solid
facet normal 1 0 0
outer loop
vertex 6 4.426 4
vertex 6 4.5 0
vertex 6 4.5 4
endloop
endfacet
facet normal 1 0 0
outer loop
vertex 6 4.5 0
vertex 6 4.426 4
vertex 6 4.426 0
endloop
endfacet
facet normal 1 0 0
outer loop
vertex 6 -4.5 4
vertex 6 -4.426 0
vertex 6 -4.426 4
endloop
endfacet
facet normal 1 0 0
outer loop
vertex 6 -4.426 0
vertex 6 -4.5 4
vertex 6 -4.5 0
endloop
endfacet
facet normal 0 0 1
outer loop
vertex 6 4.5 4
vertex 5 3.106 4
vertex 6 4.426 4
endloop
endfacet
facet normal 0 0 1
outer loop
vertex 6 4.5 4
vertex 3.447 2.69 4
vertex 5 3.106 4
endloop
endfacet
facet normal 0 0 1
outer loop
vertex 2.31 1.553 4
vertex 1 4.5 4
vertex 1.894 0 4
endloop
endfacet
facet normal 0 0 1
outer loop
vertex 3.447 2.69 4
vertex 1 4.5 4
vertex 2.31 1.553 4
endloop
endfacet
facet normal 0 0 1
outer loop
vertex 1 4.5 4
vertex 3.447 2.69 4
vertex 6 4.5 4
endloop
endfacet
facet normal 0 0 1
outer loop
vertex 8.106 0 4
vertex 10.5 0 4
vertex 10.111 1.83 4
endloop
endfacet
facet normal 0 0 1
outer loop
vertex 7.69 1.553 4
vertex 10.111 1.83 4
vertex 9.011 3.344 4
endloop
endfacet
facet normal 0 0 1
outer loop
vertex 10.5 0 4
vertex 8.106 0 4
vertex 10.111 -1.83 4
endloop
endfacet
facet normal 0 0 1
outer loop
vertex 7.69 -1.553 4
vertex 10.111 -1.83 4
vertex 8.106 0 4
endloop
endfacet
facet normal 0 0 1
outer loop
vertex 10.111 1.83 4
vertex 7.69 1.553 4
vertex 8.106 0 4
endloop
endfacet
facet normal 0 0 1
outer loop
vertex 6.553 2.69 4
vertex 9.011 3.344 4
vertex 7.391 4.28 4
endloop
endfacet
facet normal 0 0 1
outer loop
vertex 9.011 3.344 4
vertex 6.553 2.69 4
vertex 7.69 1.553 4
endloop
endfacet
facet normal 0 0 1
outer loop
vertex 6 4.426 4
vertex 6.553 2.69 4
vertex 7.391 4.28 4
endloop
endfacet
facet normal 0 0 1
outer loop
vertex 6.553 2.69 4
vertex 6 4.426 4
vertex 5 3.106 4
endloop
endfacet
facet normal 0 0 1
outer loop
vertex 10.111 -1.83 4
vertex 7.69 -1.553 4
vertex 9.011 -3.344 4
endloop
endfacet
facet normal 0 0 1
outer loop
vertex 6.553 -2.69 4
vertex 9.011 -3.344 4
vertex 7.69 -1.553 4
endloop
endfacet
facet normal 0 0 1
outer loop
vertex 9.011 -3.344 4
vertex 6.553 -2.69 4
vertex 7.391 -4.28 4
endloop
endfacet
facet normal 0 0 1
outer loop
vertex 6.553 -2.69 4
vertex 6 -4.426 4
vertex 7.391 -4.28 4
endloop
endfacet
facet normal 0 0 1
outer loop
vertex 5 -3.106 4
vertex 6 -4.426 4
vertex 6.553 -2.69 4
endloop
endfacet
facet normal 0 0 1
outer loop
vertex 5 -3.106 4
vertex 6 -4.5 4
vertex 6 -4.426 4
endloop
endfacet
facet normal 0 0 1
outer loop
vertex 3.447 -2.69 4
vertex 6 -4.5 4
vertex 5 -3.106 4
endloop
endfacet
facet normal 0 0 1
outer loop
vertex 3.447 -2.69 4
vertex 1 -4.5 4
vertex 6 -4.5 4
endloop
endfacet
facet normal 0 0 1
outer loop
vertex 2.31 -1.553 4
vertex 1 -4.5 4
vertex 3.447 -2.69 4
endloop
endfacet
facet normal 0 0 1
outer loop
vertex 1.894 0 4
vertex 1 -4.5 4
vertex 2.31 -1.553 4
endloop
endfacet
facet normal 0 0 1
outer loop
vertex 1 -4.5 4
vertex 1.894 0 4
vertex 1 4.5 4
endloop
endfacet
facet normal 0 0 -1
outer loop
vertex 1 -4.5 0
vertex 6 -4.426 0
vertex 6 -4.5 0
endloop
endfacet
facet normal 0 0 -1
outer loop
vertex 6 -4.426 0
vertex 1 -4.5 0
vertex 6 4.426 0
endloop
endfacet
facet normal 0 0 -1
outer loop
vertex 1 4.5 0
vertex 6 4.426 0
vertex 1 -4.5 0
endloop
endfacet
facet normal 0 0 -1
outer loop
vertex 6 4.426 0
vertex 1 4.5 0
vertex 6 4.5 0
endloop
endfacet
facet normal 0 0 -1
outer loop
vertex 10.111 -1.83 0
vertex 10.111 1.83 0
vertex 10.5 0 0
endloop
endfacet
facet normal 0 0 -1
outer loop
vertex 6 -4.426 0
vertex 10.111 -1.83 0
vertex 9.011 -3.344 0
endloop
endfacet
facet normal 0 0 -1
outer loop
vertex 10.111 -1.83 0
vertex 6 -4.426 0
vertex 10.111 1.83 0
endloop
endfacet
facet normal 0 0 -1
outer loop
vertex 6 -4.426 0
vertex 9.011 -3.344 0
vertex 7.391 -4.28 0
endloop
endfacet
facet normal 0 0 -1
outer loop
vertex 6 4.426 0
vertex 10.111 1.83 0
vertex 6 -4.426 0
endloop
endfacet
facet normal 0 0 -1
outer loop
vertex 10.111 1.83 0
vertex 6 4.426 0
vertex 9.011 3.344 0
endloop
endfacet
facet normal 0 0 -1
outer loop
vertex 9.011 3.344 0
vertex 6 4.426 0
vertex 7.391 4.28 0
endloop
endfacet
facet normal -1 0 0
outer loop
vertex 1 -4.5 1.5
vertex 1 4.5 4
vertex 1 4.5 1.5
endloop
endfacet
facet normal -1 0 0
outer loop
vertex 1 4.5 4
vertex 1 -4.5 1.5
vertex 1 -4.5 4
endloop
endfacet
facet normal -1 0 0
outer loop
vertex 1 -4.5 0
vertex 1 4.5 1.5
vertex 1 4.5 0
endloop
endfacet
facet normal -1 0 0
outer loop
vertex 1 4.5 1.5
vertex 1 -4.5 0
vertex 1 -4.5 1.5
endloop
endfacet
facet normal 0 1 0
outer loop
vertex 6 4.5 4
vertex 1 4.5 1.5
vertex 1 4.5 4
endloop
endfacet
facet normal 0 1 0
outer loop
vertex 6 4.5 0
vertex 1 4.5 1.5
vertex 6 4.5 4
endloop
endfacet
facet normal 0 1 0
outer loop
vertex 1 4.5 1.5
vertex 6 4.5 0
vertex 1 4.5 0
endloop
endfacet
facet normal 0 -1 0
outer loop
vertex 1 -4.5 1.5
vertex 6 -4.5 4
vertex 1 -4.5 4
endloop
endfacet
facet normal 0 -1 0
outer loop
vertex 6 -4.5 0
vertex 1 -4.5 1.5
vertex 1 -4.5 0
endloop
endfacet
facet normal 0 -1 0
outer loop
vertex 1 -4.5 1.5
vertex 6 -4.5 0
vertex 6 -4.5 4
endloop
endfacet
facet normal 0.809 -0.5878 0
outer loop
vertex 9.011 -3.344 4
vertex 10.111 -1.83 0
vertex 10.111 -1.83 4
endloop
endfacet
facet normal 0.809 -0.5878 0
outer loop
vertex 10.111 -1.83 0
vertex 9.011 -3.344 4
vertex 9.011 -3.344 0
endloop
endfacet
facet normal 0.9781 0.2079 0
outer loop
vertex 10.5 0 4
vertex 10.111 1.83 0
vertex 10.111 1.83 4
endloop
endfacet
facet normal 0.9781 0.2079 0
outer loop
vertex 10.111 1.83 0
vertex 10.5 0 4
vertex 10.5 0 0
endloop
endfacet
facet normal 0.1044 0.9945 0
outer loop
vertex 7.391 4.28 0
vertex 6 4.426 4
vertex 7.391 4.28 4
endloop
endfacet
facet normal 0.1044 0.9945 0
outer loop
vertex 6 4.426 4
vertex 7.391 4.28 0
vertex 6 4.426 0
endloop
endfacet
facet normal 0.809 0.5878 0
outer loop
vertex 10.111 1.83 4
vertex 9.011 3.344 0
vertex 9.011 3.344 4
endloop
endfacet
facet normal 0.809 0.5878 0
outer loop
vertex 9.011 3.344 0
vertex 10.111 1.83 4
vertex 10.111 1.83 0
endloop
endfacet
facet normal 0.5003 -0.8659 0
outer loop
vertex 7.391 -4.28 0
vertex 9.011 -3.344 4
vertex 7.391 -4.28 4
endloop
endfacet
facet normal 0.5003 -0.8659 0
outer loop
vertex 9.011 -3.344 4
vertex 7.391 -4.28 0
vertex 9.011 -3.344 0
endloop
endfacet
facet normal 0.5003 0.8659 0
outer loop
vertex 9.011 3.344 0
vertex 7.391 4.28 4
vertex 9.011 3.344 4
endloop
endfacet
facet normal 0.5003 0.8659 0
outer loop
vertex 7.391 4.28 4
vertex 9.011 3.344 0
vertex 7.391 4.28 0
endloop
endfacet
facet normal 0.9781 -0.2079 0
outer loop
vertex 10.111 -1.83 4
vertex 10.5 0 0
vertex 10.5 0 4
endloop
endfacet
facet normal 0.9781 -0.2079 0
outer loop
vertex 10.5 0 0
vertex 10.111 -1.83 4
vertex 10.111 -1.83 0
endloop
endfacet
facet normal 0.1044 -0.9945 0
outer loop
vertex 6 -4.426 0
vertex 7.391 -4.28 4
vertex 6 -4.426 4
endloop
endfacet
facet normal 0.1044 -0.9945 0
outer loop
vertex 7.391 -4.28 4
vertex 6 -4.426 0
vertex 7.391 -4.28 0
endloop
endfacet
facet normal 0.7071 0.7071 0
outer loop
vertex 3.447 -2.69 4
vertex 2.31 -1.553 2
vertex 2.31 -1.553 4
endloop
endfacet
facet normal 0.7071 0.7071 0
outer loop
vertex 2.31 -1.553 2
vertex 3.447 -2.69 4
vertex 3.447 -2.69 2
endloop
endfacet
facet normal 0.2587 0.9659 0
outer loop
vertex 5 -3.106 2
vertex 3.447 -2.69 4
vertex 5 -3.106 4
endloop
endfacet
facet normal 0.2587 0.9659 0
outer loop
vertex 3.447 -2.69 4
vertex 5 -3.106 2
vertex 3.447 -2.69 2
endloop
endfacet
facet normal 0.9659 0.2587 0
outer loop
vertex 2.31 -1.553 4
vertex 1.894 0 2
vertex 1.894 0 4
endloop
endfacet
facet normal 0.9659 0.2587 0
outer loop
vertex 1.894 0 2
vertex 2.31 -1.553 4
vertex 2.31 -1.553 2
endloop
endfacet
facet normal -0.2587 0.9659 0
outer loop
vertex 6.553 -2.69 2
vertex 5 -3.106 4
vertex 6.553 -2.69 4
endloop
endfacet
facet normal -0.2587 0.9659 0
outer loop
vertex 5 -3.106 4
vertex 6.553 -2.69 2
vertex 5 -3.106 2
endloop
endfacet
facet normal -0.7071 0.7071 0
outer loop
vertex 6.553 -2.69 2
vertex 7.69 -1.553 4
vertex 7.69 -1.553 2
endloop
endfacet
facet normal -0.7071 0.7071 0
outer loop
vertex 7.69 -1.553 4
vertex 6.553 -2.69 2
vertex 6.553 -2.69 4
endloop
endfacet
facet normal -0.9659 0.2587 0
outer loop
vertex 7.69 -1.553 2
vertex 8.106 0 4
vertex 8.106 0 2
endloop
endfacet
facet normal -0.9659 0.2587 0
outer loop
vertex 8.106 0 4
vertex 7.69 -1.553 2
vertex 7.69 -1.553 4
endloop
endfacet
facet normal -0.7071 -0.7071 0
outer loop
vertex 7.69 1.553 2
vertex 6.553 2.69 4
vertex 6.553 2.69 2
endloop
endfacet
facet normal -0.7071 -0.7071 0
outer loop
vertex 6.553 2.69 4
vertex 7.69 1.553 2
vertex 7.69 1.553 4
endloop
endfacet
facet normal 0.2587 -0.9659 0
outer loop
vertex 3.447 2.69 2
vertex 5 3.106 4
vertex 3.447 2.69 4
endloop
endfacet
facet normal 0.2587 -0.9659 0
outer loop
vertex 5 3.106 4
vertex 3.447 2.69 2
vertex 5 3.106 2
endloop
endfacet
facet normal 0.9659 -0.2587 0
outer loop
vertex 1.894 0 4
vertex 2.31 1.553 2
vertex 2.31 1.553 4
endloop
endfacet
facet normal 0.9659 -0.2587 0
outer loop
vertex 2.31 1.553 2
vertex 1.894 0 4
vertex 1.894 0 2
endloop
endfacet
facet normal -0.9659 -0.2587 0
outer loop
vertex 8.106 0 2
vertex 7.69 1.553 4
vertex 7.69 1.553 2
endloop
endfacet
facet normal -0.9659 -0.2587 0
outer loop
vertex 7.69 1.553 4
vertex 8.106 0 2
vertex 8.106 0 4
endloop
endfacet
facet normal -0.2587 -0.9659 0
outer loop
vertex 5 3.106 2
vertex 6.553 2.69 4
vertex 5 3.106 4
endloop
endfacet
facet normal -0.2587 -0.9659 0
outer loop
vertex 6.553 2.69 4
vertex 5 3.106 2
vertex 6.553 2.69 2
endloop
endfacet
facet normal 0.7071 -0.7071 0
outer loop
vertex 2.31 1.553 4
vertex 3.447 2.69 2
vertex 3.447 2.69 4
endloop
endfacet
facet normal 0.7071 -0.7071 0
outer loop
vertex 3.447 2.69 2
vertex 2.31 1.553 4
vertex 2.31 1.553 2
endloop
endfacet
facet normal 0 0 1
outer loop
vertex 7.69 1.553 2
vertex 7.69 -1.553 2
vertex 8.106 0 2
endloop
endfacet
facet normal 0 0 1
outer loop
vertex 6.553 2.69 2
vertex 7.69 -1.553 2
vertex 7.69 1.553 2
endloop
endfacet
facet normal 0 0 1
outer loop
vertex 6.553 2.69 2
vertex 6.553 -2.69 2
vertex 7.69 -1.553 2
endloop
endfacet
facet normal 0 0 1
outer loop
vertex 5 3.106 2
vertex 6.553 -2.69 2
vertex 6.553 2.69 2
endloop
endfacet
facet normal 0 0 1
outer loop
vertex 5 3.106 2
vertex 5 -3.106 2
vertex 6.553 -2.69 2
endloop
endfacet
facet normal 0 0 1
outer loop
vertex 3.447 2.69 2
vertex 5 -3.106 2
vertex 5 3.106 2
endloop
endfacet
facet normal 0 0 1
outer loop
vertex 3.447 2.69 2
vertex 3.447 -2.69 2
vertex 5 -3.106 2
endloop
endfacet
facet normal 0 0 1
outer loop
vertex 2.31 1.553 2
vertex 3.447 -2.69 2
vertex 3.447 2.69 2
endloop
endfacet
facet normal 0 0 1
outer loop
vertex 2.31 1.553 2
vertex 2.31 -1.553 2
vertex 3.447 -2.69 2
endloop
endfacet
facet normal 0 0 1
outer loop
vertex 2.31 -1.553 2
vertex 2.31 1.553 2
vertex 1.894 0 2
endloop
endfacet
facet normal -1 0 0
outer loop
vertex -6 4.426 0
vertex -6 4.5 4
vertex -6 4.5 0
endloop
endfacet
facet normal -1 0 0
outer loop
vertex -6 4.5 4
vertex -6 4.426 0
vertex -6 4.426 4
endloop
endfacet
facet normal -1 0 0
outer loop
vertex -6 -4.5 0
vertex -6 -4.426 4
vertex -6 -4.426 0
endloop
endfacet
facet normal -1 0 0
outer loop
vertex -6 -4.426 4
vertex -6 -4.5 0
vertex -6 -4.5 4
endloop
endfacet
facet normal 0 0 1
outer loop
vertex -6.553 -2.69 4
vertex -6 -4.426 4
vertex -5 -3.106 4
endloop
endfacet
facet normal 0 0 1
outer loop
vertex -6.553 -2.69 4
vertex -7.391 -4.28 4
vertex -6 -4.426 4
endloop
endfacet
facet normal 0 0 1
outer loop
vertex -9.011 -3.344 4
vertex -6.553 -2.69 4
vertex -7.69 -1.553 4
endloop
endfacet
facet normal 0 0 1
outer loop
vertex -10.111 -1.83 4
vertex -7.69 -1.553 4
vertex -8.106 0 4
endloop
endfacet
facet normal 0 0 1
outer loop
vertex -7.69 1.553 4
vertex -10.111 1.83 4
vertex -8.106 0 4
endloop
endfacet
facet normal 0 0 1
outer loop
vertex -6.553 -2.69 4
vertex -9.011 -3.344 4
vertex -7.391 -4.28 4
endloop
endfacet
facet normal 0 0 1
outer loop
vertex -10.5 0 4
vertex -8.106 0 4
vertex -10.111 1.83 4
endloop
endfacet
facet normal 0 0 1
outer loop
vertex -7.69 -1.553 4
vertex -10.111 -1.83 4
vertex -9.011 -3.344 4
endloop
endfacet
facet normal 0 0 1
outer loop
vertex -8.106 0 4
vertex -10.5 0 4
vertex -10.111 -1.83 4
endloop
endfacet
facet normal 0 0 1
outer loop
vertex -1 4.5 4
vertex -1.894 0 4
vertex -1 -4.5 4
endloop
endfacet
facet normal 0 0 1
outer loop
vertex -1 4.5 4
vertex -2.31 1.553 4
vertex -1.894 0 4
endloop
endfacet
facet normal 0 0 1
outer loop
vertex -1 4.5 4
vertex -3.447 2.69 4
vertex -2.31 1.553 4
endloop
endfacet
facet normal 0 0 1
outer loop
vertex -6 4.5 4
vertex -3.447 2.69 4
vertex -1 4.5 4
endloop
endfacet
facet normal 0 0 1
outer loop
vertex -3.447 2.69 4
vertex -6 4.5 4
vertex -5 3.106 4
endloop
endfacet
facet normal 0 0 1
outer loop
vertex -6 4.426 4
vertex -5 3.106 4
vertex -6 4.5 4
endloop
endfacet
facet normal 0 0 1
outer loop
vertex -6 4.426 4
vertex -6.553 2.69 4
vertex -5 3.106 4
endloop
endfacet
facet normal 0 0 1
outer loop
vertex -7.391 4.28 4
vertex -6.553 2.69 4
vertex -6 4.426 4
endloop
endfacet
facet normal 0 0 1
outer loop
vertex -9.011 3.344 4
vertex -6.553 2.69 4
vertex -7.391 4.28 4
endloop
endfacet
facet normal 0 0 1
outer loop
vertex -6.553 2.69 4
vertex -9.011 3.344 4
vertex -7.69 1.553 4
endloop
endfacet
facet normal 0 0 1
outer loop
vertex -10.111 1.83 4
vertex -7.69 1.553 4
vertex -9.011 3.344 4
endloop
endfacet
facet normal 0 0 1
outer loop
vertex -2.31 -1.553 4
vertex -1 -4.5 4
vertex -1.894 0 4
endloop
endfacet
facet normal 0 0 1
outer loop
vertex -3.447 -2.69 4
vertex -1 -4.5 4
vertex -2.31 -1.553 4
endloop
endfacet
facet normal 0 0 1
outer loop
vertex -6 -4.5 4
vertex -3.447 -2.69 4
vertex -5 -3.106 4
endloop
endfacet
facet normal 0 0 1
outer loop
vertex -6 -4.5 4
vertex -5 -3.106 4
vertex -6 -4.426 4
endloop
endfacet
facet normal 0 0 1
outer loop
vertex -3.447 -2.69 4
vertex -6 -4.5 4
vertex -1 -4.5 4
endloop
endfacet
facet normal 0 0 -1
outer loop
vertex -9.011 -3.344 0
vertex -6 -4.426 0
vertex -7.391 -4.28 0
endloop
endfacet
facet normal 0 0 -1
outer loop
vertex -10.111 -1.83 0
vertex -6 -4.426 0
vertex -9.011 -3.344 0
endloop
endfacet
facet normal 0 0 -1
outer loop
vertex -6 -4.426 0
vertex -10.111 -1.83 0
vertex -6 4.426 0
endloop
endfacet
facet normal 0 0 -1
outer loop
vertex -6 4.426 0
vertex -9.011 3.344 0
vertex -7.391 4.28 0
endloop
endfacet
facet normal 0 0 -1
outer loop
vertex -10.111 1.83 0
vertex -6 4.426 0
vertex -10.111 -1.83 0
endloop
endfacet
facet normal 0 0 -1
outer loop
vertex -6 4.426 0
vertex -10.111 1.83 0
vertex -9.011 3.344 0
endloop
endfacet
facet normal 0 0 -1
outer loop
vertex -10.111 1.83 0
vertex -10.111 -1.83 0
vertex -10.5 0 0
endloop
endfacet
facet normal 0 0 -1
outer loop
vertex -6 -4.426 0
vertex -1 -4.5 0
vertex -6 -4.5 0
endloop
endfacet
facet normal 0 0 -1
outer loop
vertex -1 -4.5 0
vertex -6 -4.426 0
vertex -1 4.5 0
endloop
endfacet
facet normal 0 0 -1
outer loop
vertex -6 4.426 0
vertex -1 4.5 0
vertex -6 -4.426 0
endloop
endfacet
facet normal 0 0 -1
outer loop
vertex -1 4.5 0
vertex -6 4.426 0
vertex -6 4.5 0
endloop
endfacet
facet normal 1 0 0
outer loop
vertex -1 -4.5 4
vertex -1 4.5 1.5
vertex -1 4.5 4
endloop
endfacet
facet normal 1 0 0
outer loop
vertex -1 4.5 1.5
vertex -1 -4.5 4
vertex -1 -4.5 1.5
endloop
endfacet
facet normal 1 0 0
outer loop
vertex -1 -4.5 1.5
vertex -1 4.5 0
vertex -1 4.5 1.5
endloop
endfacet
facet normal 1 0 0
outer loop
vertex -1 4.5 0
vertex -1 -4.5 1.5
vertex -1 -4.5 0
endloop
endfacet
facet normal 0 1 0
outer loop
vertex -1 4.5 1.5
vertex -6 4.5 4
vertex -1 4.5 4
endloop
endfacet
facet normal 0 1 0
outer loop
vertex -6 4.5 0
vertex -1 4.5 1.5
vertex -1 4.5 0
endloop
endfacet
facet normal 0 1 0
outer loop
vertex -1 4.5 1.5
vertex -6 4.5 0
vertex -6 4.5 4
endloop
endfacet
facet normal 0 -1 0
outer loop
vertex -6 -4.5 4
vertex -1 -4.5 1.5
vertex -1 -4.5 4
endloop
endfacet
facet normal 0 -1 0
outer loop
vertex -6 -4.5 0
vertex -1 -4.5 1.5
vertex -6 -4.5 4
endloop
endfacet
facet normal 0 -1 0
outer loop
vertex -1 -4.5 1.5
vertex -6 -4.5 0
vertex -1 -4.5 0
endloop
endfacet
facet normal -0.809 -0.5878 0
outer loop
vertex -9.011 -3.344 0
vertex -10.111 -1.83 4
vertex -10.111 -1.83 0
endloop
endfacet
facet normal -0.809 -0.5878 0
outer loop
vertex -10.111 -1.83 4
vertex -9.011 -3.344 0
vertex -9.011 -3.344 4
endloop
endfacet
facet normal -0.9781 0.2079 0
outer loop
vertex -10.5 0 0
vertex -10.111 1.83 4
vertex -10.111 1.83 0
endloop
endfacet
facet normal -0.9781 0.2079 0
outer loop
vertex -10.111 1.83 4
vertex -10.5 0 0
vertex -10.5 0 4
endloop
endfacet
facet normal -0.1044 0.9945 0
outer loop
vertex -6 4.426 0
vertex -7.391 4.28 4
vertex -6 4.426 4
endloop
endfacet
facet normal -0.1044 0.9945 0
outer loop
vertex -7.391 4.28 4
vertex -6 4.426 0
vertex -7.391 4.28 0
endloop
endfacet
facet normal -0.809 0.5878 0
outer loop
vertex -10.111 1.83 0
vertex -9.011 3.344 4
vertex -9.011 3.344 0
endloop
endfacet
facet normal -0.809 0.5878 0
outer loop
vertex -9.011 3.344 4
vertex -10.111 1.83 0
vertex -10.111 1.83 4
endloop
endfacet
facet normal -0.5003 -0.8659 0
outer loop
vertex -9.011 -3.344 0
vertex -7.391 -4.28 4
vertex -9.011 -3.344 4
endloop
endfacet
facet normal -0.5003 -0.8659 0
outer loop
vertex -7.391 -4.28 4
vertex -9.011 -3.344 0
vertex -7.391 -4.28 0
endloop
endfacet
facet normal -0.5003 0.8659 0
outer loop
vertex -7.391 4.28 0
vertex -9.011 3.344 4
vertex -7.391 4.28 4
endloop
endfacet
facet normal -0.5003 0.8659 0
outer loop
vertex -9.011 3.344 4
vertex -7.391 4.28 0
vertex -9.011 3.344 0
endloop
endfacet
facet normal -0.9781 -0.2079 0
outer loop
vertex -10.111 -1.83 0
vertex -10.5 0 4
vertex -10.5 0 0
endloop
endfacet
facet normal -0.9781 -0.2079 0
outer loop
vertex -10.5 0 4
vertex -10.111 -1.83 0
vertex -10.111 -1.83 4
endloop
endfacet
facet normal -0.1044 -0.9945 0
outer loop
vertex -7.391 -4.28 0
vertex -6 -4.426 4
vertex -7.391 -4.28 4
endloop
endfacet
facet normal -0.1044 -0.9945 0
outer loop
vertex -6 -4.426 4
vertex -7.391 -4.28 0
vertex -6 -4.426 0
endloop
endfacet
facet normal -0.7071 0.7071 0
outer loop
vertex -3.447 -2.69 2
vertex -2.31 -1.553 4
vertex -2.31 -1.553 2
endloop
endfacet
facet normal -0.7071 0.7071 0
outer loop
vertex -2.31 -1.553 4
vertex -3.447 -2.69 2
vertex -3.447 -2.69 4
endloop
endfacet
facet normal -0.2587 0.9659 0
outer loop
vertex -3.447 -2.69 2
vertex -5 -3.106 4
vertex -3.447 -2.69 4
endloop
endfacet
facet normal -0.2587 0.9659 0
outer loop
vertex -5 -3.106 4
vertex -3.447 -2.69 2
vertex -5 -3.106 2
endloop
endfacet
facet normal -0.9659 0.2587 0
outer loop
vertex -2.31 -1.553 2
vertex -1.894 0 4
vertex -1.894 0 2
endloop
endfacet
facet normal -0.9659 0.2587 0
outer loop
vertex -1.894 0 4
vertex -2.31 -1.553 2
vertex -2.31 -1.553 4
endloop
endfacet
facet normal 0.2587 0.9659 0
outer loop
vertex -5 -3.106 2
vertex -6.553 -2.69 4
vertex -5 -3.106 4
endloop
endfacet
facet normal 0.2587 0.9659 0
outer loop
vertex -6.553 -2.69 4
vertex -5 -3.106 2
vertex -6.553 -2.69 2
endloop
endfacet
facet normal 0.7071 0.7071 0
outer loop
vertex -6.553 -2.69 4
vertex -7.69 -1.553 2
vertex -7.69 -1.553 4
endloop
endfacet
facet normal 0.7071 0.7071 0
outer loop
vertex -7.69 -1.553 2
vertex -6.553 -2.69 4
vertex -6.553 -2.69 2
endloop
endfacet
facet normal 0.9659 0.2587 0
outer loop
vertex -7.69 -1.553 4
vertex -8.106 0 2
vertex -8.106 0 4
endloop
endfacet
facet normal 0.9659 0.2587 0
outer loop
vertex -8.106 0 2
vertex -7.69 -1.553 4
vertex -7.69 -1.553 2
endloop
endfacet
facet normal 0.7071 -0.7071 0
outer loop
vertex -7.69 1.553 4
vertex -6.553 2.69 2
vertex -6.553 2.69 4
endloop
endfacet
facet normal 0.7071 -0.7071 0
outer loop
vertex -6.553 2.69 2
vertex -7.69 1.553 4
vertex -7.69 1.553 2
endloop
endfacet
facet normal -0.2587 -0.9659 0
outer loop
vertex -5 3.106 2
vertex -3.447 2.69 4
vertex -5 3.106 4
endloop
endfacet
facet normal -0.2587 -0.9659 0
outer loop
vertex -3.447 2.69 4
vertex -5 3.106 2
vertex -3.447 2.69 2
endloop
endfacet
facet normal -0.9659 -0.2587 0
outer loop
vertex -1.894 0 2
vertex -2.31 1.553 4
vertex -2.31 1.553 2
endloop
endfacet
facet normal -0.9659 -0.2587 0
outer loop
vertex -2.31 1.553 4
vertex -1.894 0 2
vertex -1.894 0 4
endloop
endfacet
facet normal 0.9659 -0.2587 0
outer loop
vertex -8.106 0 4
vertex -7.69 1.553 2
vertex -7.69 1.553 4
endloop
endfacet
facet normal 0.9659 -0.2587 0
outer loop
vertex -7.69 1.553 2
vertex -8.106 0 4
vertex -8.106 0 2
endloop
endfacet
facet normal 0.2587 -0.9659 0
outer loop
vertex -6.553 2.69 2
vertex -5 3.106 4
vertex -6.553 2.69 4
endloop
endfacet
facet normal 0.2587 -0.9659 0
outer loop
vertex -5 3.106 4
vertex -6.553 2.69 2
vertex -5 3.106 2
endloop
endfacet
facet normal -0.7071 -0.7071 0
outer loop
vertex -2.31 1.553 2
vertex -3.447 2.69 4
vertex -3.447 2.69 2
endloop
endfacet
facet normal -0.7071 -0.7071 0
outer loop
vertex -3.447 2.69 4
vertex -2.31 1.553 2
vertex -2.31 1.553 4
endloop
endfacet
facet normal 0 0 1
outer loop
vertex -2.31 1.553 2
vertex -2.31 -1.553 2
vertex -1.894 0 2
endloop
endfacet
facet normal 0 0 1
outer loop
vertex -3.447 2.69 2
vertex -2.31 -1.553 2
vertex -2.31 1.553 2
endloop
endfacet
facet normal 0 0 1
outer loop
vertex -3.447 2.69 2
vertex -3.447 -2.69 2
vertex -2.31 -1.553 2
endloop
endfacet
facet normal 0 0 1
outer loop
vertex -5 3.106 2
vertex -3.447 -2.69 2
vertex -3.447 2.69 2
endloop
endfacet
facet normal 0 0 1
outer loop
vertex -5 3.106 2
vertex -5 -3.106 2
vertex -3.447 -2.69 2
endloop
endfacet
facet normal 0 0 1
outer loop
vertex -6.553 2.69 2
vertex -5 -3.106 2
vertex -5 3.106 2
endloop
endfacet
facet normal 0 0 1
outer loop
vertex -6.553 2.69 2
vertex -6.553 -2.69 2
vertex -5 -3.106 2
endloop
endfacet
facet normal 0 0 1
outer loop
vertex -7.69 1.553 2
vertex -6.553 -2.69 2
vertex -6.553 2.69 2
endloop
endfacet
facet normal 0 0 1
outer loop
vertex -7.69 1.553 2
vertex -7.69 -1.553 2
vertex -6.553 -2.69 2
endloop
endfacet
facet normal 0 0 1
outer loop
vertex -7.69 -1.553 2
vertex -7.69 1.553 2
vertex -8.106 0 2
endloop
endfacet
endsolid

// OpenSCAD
// file: parameters.scad
// Parameters file for RepRap Huxley

pi=3.14159265;

// The relative location in your file system where the .dxf files are
// DXFs are for quick development.  They should be replaced by parameterised CSG in dure course.

fileroot="DXF-files/";

rodsize = 6;	//threaded/smooth rod diameter in mm
xaxis = 182.5;	//width of base in mm
yaxis = 266.5;	//length of base in mm


screwsize = 3;	//bearing bore/screw diameter in mm
bearingsize = 10;	//outer diameter of bearings in mm
bearingwidth = 4;	//width of bearings in mm


rodpitch = rodsize / 6;
rodnutsize = 0.8 * rodsize; //4.8
rodwashersize = 0.2 * rodsize; //1.2
rodwasherdiameter = 2 * rodsize;//12
screwpitch = screwsize / 6;
nutsize = 0.8 * screwsize;
nutdiameter = 1.9 * screwsize;
washersize = 0.2 * screwsize;
washerdiameter = 2 * screwsize;
partthick = 2 * (rodsize+1); //12
vertexrodspace = 2 * rodsize; //12


c = [0.3, 0.3, 0.3];
rodendoffset = rodnutsize + rodwashersize * 2 + partthick / 2;//13.2
vertexoffset = vertexrodspace + rodendoffset;//25.2
//vertexoffset = 22;

renderrodthreads = false;
renderscrewthreads = false;
fn = 36;

// The gap between the joining rods at a vertex

vertex_radius=sqrt(rodsize*rodsize + vertexoffset*vertexoffset);
vertex_ang = atan(vertexoffset/rodsize)-30;
vertex_gap = 2*vertex_radius*cos(vertex_ang);

// Nema 14 dimensions - these are absolute

nema14_square=35.3;
nema14_screws=26;
nema14_screw_r=1.5;
nema14_hub=22;
nema14_hub_depth=2;
nema14_length=36;
nema14_shaft=5;
nema14_shaft_length=66;
nema14_shaft_projection=19;

// Nema 11 dimensions - these are absolute

nema11_square=28.5;
nema11_screws=23;
nema11_screw_r=1.25;
nema11_hub=22;
nema11_hub_depth=2;
nema11_length=44.5;
nema11_shaft=5;
nema11_shaft_length=78;
nema11_shaft_projection=18;

// Limit switch parameters

limit_switch_hole_diameter=2.5;
limit_switch_centres=9.5;

// The RepRap slide bearings

bearing_mount_centres=18;
bearing_width=7;

// X axis parameters - many should be relative

x_bar_gap=30;
motor_center_y = 26;
bar_clamp_x=5;
bar_clamp_y=8;
bar_clamp_x_gap=23;
bearing_y=50;
bearing_x=bar_clamp_x_gap + 10;
hole_land=4;
thickness=5;
bearing_low_z = 8;
bearing_z_gap = 25;
bearing_plate_width = bearing_mount_centres+2*hole_land + 10;
bearing_plate_overlap=0.5;
bearing_plate_support=10;
// main file
use <library.scad>;

module test()
{
	translate([0,0,2])
	difference()
	{
	translate([8,0,0])
	difference()
	{
		union()
		{
			translate([-4.5,0,0])cube([5,9,4], center=true);
			translate([-2,0,0]) cylinder(h=4,r=4.5,center=true);
		}
		translate([-3,0,0]) polyhole(6,6);
	}
	translate([0,0,1]) cube([2,12,3], center=true);
	}
}

test();
mirror([1,0,0]) test();
